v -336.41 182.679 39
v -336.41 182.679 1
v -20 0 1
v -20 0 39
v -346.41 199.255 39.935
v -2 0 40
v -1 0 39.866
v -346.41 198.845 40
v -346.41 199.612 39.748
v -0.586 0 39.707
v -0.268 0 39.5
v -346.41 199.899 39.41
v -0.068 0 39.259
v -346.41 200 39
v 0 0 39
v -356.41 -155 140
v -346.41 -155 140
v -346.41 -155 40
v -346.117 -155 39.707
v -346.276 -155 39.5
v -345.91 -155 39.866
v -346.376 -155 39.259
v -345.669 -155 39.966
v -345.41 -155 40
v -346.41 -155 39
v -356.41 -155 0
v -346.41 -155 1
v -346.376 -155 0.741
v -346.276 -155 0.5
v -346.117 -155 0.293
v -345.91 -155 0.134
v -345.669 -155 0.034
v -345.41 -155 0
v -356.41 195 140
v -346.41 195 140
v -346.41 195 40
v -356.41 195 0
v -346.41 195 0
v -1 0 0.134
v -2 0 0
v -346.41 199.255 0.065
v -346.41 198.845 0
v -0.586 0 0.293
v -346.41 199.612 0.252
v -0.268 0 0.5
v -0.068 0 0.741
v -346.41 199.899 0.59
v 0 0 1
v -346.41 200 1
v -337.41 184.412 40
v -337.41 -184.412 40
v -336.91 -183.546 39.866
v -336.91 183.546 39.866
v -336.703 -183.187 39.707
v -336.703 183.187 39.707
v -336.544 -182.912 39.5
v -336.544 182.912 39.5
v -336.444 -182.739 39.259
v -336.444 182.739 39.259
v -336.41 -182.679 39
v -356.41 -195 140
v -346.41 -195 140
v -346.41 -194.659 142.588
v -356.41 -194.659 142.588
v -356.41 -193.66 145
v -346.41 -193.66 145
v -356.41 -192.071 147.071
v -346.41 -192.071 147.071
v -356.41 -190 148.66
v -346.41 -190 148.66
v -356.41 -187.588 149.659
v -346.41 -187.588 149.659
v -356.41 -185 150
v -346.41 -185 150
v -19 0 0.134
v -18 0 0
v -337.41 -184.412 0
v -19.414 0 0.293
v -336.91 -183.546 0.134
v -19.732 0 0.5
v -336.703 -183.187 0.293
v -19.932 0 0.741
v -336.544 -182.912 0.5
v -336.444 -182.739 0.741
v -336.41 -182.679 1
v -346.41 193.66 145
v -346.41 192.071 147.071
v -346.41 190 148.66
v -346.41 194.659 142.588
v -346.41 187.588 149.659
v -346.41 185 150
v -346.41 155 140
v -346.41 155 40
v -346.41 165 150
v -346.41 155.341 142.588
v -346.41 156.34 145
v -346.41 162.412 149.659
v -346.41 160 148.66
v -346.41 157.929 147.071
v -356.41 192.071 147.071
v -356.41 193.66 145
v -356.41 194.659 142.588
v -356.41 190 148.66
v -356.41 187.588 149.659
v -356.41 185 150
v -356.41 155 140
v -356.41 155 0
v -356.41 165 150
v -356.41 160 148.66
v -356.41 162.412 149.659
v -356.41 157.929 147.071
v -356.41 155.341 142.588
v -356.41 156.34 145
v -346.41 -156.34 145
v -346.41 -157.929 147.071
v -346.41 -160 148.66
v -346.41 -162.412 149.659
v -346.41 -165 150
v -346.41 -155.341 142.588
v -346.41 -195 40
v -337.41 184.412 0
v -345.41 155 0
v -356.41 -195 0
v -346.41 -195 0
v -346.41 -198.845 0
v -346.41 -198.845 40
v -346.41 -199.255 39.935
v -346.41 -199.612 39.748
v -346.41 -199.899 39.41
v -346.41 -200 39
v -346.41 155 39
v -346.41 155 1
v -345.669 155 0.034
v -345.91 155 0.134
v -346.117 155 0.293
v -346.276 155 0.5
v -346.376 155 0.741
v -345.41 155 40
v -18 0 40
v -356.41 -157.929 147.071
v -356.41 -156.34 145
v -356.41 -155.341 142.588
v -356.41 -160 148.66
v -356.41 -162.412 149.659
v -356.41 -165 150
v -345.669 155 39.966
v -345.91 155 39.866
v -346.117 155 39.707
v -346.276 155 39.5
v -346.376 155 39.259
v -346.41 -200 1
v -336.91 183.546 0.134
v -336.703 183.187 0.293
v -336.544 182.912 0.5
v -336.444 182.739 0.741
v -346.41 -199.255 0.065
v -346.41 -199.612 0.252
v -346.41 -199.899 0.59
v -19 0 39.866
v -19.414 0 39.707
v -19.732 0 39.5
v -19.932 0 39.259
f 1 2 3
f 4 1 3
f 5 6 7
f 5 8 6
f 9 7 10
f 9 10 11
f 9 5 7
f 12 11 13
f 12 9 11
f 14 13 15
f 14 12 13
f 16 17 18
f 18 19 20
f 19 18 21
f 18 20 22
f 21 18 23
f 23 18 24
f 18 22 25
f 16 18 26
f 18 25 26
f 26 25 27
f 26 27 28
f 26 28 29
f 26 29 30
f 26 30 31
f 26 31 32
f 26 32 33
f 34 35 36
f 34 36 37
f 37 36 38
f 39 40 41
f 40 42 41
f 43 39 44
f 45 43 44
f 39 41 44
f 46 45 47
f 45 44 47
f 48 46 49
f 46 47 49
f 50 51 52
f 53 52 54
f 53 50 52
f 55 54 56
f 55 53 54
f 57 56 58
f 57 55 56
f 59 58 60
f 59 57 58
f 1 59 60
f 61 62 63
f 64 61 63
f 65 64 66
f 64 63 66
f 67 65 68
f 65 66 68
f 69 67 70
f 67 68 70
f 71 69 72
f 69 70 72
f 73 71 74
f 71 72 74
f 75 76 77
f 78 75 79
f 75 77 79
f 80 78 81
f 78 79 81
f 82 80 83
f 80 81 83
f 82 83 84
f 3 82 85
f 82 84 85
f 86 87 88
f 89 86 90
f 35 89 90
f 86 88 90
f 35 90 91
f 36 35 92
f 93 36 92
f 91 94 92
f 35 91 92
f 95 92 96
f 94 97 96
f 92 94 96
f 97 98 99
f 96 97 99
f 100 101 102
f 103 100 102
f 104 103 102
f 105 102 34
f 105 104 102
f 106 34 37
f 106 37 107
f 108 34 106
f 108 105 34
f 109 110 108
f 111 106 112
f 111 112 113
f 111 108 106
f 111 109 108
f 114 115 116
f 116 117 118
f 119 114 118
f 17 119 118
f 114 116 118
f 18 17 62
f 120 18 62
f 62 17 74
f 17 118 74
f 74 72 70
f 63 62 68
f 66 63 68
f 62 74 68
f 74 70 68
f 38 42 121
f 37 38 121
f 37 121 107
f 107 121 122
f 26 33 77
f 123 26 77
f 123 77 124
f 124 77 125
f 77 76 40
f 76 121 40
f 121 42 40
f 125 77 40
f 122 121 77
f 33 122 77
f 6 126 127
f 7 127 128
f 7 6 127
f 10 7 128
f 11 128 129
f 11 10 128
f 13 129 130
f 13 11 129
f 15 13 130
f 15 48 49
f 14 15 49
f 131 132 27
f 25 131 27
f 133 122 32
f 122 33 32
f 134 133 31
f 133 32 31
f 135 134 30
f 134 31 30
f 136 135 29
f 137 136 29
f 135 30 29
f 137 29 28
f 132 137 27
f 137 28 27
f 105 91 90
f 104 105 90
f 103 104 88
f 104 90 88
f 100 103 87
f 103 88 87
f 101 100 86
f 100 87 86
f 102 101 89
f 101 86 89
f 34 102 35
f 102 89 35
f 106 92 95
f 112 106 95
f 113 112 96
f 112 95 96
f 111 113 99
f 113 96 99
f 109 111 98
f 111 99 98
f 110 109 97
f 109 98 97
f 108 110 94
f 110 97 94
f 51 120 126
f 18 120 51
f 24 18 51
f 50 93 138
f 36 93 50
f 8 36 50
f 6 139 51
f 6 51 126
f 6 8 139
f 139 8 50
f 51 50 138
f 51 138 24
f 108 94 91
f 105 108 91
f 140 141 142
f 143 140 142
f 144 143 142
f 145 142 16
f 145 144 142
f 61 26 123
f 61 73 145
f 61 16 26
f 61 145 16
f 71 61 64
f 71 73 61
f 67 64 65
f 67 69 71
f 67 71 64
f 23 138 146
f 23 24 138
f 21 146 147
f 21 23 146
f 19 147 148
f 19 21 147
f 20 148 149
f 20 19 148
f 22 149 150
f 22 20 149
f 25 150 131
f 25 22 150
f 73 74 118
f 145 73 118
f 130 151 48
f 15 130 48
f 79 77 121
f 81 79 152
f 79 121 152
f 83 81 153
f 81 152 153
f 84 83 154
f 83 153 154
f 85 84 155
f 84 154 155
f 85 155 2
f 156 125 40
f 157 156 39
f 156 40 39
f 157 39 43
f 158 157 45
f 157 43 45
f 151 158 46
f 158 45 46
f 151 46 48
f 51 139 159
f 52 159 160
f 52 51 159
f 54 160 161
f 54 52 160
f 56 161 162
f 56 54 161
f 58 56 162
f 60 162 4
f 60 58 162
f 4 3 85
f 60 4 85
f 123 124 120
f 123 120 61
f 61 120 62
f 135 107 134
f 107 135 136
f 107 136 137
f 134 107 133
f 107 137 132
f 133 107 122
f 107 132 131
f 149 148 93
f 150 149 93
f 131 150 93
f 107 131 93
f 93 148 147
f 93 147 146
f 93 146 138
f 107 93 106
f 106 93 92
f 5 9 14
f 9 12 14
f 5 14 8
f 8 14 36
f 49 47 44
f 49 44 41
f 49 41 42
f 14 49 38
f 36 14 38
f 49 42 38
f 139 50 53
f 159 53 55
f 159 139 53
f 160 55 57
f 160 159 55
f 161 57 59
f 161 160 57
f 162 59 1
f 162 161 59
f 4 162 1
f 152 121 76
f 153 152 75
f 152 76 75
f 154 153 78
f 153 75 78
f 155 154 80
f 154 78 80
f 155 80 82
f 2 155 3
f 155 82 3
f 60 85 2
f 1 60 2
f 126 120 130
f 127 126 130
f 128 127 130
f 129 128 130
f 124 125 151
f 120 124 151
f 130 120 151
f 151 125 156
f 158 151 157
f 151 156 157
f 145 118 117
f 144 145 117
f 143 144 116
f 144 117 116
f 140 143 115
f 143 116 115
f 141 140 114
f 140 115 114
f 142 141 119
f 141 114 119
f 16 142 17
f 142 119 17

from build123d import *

# Parameters (mm, degrees)
F1_DEPTH = 40
F3_DEPTH = 10
F4_R     = 1


with BuildPart() as f1:
    # F0 (on Top) → F1 (new body)
    with BuildSketch(Plane.XY):
        Polygon((-346.4101615138, -200), (0, 0), (-346.4101615138, 200), align=None)
        Polygon((-336.4101615138, 182.6794919243), (-20, 0), (-336.4101615138, -182.6794919243), align=None, mode=Mode.SUBTRACT)
    extrude(amount=F1_DEPTH)

    # F2 (on face) → F3 (join)
    with BuildSketch(Plane(origin=(-346.4101615138, 0, 0), x_dir=(0, -1, 0), z_dir=(-1, 0, 0))):
        with BuildLine():
            Line((-195, 140), (-195, 0))
            Line((-195, 0), (-155, 0))
            Line((-155, 0), (-155, 140))
            ThreePointArc((-155, 140), (-157.9289321881, 147.0710678119), (-165, 150))
            Line((-165, 150), (-185, 150))
            ThreePointArc((-185, 150), (-192.0710678119, 147.0710678119), (-195, 140))
        make_face()
        with BuildLine():
            Line((155, 0), (195, 0))
            Line((195, 0), (195, 140))
            ThreePointArc((195, 140), (192.0710678119, 147.0710678119), (185, 150))
            Line((185, 150), (165, 150))
            ThreePointArc((165, 150), (157.9289321881, 147.0710678119), (155, 140))
            Line((155, 140), (155, 0))
        make_face()
    extrude(amount=F3_DEPTH)

    # F4
    f4_edges = [f1.edges().sort_by_distance(p)[0] for p in [
        (-346.410162, 0, 40),
        (-178.205081, 91.339746, 40),
        (-173.205081, 100, 40),
        (-173.205081, -100, 40),
        (-178.205081, -91.339746, 40),
        (-336.410162, 0, 40),
        (-173.205081, -100, 0),
        (-173.205081, 100, 0),
        (-346.410162, 0, 0),
        (-178.205081, -91.339746, 0),
        (-178.205081, 91.339746, 0),
        (-336.410162, 0, 0),
    ]]
    fillet(f4_edges, radius=F4_R)


solid = f1.part
